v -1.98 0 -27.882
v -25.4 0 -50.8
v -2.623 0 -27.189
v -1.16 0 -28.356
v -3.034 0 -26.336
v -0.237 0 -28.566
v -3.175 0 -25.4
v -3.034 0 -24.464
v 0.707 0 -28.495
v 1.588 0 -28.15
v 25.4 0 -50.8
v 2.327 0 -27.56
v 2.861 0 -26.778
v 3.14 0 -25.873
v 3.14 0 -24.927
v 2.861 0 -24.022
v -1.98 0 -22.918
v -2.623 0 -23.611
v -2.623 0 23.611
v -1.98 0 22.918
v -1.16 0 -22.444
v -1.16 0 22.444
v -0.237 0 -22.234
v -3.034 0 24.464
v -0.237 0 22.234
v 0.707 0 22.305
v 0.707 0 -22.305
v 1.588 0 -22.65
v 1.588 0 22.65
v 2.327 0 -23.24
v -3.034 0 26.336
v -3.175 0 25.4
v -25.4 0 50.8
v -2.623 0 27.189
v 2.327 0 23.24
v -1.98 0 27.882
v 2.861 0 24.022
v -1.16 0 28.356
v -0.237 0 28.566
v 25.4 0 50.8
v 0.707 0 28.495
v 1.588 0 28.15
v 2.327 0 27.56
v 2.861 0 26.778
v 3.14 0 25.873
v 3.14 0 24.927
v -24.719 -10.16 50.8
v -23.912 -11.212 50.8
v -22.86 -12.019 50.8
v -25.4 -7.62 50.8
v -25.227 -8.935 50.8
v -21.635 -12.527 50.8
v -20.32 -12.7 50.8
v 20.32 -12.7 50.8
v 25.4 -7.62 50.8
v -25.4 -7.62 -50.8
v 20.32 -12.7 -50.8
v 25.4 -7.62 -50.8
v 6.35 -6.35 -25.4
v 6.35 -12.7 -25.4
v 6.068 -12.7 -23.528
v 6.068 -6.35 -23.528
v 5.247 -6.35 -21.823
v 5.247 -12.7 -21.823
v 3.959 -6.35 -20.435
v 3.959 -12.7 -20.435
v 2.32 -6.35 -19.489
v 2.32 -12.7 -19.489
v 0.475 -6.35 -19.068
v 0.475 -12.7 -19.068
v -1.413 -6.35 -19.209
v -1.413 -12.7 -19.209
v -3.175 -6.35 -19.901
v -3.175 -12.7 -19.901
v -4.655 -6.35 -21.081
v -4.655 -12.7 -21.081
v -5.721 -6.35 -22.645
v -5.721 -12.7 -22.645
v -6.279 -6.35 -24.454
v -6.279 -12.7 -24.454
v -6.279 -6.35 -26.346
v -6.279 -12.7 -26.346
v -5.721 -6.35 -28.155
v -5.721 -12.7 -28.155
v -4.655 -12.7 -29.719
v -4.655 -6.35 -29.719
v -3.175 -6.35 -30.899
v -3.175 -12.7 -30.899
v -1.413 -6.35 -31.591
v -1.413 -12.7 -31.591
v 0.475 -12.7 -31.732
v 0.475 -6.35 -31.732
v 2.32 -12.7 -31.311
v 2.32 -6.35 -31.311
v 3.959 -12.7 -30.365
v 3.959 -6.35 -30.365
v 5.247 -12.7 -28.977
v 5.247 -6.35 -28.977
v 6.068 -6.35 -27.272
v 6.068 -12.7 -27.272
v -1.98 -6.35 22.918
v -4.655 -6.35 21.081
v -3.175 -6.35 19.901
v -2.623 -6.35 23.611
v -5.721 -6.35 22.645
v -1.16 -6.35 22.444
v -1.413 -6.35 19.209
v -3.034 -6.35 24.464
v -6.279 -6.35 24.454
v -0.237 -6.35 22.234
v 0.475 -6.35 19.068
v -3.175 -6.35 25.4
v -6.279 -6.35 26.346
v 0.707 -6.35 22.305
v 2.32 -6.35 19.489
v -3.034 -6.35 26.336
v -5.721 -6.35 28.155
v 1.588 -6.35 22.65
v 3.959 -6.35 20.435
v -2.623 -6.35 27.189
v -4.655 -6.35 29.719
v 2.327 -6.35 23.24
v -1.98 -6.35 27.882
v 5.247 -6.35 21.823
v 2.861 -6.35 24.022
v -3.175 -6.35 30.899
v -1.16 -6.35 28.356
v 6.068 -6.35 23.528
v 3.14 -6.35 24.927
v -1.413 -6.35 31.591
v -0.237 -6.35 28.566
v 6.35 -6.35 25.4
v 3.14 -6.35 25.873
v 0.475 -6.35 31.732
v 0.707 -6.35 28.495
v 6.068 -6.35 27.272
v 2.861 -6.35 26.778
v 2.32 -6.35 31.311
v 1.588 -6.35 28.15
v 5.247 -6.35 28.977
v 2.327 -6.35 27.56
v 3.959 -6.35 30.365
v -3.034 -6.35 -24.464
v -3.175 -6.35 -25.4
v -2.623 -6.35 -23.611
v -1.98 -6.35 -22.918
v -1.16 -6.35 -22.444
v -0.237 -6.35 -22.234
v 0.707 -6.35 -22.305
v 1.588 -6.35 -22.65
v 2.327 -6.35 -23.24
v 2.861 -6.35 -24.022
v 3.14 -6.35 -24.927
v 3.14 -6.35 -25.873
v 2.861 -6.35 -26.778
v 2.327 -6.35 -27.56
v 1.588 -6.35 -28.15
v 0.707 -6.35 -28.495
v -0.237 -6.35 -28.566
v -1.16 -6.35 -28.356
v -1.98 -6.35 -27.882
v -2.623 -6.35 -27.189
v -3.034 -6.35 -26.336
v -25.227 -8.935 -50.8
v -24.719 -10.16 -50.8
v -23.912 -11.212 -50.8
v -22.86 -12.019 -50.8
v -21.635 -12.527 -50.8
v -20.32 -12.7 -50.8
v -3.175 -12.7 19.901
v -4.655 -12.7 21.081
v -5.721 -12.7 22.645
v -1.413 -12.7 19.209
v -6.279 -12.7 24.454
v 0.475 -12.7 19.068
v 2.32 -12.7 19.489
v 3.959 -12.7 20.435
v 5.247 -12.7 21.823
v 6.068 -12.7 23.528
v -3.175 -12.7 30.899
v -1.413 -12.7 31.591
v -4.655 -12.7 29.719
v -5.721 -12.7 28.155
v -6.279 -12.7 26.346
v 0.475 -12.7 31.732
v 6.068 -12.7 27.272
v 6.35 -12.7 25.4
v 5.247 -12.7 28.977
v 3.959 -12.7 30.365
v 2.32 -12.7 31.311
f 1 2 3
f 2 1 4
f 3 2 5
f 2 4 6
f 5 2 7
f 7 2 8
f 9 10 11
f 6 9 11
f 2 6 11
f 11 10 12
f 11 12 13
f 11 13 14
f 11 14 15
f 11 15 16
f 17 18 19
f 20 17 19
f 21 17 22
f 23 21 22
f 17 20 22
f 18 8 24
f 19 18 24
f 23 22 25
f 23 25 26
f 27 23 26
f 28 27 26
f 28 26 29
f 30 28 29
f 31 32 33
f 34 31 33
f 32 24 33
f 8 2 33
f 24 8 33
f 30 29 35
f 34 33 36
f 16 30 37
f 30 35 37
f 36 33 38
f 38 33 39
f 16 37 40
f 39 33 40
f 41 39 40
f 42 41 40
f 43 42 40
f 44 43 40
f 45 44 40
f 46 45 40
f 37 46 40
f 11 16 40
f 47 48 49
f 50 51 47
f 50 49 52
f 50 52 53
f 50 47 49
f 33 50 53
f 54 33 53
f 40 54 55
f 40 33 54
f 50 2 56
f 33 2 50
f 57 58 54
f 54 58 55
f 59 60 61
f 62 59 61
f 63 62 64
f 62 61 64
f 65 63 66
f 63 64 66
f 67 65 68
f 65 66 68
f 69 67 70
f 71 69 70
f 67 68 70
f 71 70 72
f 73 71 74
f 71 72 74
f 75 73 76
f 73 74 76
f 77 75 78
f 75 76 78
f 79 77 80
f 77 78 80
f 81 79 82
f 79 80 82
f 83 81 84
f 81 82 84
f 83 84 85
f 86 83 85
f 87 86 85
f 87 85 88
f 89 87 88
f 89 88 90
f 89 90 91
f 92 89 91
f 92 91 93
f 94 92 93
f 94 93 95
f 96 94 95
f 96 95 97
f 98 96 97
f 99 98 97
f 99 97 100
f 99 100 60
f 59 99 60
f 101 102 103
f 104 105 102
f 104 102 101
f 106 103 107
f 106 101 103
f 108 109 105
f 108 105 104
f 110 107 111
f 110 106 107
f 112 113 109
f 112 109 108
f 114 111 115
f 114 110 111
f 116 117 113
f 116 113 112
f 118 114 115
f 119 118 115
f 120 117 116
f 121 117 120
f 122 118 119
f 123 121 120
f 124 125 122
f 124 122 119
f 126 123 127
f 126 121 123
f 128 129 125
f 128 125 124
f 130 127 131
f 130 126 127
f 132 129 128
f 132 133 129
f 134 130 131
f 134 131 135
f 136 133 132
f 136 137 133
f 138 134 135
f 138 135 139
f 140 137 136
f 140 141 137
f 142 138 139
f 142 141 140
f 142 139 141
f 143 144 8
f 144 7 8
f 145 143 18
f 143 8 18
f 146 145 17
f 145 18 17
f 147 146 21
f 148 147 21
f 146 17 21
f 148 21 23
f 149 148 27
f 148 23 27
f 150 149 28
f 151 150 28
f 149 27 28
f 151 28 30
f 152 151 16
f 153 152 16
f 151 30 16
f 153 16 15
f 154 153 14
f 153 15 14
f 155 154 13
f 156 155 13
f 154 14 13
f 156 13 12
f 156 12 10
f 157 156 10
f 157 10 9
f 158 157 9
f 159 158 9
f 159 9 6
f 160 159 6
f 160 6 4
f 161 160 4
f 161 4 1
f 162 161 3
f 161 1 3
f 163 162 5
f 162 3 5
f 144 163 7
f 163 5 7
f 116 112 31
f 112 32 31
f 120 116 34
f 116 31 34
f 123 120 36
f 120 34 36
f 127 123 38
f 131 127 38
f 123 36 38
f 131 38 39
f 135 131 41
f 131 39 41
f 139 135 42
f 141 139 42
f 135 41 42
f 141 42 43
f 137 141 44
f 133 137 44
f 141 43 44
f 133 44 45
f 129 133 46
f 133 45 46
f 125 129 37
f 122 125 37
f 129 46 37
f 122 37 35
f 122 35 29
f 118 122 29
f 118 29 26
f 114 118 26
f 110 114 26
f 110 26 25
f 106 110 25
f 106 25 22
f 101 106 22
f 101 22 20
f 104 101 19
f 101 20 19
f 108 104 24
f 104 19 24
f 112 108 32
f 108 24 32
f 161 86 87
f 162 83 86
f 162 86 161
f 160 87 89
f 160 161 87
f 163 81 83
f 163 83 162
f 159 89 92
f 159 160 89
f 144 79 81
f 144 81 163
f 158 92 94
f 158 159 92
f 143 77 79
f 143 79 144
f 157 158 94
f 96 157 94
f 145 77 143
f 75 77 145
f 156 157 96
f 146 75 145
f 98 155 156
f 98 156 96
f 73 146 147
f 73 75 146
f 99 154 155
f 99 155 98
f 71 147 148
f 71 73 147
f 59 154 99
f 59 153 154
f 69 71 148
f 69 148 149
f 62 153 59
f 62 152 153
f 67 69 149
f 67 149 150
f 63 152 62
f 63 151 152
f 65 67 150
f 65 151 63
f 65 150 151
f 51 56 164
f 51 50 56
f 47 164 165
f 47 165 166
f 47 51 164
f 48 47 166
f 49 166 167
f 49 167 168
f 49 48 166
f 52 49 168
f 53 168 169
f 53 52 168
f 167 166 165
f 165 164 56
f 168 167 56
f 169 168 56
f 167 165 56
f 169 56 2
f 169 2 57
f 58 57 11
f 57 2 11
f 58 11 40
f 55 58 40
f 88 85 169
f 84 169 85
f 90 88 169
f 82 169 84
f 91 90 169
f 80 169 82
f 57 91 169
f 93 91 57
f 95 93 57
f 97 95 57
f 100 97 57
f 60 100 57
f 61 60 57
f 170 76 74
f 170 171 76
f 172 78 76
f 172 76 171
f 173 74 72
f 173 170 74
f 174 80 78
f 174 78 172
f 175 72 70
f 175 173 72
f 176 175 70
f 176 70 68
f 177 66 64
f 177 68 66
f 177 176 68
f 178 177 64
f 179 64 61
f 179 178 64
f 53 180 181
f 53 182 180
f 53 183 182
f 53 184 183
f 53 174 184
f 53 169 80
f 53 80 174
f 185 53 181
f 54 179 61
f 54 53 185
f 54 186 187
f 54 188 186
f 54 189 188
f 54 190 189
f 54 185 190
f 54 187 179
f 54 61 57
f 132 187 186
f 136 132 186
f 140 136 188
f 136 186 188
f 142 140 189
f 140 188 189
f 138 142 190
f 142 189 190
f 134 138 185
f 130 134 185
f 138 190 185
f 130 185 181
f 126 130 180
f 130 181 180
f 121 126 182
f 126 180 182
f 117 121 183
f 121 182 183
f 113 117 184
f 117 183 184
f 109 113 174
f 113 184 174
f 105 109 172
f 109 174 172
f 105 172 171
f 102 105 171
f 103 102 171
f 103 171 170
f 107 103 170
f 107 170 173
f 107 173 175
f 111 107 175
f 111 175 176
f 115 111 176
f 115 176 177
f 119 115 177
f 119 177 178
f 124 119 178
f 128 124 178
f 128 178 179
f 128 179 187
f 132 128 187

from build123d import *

# Parameters (mm, degrees)
F0_W           = 50.8
F0_H           = 101.6
F1_DEPTH       = 12.7
F3_D           = 6.35
F3_CBORE_D     = 12.7
F3_CBORE_DEPTH = 6.35
F4_R           = 5.08
F5_SIZE        = 5.08


with BuildPart() as f1:
    # F0 (on Front) → F1 (new body)
    with BuildSketch(Plane.XZ):
        Rectangle(F0_W, F0_H)
    extrude(amount=F1_DEPTH)

    # F3 (through all)
    with Locations(Plane.XZ.offset(12.7)):
        with Locations((0, 25.4), (0, -25.4)):
            CounterBoreHole(F3_D / 2, F3_CBORE_D / 2, F3_CBORE_DEPTH)

    # F4
    f4_edges = [f1.edges().sort_by_distance(p)[0] for p in [
        (-25.4, -12.7, 0),
    ]]
    fillet(f4_edges, radius=F4_R)

    # F5
    f5_edges = [f1.edges().sort_by_distance(p)[0] for p in [
        (25.4, -12.7, 0),
    ]]
    chamfer(f5_edges, length=F5_SIZE)


solid = f1.part
